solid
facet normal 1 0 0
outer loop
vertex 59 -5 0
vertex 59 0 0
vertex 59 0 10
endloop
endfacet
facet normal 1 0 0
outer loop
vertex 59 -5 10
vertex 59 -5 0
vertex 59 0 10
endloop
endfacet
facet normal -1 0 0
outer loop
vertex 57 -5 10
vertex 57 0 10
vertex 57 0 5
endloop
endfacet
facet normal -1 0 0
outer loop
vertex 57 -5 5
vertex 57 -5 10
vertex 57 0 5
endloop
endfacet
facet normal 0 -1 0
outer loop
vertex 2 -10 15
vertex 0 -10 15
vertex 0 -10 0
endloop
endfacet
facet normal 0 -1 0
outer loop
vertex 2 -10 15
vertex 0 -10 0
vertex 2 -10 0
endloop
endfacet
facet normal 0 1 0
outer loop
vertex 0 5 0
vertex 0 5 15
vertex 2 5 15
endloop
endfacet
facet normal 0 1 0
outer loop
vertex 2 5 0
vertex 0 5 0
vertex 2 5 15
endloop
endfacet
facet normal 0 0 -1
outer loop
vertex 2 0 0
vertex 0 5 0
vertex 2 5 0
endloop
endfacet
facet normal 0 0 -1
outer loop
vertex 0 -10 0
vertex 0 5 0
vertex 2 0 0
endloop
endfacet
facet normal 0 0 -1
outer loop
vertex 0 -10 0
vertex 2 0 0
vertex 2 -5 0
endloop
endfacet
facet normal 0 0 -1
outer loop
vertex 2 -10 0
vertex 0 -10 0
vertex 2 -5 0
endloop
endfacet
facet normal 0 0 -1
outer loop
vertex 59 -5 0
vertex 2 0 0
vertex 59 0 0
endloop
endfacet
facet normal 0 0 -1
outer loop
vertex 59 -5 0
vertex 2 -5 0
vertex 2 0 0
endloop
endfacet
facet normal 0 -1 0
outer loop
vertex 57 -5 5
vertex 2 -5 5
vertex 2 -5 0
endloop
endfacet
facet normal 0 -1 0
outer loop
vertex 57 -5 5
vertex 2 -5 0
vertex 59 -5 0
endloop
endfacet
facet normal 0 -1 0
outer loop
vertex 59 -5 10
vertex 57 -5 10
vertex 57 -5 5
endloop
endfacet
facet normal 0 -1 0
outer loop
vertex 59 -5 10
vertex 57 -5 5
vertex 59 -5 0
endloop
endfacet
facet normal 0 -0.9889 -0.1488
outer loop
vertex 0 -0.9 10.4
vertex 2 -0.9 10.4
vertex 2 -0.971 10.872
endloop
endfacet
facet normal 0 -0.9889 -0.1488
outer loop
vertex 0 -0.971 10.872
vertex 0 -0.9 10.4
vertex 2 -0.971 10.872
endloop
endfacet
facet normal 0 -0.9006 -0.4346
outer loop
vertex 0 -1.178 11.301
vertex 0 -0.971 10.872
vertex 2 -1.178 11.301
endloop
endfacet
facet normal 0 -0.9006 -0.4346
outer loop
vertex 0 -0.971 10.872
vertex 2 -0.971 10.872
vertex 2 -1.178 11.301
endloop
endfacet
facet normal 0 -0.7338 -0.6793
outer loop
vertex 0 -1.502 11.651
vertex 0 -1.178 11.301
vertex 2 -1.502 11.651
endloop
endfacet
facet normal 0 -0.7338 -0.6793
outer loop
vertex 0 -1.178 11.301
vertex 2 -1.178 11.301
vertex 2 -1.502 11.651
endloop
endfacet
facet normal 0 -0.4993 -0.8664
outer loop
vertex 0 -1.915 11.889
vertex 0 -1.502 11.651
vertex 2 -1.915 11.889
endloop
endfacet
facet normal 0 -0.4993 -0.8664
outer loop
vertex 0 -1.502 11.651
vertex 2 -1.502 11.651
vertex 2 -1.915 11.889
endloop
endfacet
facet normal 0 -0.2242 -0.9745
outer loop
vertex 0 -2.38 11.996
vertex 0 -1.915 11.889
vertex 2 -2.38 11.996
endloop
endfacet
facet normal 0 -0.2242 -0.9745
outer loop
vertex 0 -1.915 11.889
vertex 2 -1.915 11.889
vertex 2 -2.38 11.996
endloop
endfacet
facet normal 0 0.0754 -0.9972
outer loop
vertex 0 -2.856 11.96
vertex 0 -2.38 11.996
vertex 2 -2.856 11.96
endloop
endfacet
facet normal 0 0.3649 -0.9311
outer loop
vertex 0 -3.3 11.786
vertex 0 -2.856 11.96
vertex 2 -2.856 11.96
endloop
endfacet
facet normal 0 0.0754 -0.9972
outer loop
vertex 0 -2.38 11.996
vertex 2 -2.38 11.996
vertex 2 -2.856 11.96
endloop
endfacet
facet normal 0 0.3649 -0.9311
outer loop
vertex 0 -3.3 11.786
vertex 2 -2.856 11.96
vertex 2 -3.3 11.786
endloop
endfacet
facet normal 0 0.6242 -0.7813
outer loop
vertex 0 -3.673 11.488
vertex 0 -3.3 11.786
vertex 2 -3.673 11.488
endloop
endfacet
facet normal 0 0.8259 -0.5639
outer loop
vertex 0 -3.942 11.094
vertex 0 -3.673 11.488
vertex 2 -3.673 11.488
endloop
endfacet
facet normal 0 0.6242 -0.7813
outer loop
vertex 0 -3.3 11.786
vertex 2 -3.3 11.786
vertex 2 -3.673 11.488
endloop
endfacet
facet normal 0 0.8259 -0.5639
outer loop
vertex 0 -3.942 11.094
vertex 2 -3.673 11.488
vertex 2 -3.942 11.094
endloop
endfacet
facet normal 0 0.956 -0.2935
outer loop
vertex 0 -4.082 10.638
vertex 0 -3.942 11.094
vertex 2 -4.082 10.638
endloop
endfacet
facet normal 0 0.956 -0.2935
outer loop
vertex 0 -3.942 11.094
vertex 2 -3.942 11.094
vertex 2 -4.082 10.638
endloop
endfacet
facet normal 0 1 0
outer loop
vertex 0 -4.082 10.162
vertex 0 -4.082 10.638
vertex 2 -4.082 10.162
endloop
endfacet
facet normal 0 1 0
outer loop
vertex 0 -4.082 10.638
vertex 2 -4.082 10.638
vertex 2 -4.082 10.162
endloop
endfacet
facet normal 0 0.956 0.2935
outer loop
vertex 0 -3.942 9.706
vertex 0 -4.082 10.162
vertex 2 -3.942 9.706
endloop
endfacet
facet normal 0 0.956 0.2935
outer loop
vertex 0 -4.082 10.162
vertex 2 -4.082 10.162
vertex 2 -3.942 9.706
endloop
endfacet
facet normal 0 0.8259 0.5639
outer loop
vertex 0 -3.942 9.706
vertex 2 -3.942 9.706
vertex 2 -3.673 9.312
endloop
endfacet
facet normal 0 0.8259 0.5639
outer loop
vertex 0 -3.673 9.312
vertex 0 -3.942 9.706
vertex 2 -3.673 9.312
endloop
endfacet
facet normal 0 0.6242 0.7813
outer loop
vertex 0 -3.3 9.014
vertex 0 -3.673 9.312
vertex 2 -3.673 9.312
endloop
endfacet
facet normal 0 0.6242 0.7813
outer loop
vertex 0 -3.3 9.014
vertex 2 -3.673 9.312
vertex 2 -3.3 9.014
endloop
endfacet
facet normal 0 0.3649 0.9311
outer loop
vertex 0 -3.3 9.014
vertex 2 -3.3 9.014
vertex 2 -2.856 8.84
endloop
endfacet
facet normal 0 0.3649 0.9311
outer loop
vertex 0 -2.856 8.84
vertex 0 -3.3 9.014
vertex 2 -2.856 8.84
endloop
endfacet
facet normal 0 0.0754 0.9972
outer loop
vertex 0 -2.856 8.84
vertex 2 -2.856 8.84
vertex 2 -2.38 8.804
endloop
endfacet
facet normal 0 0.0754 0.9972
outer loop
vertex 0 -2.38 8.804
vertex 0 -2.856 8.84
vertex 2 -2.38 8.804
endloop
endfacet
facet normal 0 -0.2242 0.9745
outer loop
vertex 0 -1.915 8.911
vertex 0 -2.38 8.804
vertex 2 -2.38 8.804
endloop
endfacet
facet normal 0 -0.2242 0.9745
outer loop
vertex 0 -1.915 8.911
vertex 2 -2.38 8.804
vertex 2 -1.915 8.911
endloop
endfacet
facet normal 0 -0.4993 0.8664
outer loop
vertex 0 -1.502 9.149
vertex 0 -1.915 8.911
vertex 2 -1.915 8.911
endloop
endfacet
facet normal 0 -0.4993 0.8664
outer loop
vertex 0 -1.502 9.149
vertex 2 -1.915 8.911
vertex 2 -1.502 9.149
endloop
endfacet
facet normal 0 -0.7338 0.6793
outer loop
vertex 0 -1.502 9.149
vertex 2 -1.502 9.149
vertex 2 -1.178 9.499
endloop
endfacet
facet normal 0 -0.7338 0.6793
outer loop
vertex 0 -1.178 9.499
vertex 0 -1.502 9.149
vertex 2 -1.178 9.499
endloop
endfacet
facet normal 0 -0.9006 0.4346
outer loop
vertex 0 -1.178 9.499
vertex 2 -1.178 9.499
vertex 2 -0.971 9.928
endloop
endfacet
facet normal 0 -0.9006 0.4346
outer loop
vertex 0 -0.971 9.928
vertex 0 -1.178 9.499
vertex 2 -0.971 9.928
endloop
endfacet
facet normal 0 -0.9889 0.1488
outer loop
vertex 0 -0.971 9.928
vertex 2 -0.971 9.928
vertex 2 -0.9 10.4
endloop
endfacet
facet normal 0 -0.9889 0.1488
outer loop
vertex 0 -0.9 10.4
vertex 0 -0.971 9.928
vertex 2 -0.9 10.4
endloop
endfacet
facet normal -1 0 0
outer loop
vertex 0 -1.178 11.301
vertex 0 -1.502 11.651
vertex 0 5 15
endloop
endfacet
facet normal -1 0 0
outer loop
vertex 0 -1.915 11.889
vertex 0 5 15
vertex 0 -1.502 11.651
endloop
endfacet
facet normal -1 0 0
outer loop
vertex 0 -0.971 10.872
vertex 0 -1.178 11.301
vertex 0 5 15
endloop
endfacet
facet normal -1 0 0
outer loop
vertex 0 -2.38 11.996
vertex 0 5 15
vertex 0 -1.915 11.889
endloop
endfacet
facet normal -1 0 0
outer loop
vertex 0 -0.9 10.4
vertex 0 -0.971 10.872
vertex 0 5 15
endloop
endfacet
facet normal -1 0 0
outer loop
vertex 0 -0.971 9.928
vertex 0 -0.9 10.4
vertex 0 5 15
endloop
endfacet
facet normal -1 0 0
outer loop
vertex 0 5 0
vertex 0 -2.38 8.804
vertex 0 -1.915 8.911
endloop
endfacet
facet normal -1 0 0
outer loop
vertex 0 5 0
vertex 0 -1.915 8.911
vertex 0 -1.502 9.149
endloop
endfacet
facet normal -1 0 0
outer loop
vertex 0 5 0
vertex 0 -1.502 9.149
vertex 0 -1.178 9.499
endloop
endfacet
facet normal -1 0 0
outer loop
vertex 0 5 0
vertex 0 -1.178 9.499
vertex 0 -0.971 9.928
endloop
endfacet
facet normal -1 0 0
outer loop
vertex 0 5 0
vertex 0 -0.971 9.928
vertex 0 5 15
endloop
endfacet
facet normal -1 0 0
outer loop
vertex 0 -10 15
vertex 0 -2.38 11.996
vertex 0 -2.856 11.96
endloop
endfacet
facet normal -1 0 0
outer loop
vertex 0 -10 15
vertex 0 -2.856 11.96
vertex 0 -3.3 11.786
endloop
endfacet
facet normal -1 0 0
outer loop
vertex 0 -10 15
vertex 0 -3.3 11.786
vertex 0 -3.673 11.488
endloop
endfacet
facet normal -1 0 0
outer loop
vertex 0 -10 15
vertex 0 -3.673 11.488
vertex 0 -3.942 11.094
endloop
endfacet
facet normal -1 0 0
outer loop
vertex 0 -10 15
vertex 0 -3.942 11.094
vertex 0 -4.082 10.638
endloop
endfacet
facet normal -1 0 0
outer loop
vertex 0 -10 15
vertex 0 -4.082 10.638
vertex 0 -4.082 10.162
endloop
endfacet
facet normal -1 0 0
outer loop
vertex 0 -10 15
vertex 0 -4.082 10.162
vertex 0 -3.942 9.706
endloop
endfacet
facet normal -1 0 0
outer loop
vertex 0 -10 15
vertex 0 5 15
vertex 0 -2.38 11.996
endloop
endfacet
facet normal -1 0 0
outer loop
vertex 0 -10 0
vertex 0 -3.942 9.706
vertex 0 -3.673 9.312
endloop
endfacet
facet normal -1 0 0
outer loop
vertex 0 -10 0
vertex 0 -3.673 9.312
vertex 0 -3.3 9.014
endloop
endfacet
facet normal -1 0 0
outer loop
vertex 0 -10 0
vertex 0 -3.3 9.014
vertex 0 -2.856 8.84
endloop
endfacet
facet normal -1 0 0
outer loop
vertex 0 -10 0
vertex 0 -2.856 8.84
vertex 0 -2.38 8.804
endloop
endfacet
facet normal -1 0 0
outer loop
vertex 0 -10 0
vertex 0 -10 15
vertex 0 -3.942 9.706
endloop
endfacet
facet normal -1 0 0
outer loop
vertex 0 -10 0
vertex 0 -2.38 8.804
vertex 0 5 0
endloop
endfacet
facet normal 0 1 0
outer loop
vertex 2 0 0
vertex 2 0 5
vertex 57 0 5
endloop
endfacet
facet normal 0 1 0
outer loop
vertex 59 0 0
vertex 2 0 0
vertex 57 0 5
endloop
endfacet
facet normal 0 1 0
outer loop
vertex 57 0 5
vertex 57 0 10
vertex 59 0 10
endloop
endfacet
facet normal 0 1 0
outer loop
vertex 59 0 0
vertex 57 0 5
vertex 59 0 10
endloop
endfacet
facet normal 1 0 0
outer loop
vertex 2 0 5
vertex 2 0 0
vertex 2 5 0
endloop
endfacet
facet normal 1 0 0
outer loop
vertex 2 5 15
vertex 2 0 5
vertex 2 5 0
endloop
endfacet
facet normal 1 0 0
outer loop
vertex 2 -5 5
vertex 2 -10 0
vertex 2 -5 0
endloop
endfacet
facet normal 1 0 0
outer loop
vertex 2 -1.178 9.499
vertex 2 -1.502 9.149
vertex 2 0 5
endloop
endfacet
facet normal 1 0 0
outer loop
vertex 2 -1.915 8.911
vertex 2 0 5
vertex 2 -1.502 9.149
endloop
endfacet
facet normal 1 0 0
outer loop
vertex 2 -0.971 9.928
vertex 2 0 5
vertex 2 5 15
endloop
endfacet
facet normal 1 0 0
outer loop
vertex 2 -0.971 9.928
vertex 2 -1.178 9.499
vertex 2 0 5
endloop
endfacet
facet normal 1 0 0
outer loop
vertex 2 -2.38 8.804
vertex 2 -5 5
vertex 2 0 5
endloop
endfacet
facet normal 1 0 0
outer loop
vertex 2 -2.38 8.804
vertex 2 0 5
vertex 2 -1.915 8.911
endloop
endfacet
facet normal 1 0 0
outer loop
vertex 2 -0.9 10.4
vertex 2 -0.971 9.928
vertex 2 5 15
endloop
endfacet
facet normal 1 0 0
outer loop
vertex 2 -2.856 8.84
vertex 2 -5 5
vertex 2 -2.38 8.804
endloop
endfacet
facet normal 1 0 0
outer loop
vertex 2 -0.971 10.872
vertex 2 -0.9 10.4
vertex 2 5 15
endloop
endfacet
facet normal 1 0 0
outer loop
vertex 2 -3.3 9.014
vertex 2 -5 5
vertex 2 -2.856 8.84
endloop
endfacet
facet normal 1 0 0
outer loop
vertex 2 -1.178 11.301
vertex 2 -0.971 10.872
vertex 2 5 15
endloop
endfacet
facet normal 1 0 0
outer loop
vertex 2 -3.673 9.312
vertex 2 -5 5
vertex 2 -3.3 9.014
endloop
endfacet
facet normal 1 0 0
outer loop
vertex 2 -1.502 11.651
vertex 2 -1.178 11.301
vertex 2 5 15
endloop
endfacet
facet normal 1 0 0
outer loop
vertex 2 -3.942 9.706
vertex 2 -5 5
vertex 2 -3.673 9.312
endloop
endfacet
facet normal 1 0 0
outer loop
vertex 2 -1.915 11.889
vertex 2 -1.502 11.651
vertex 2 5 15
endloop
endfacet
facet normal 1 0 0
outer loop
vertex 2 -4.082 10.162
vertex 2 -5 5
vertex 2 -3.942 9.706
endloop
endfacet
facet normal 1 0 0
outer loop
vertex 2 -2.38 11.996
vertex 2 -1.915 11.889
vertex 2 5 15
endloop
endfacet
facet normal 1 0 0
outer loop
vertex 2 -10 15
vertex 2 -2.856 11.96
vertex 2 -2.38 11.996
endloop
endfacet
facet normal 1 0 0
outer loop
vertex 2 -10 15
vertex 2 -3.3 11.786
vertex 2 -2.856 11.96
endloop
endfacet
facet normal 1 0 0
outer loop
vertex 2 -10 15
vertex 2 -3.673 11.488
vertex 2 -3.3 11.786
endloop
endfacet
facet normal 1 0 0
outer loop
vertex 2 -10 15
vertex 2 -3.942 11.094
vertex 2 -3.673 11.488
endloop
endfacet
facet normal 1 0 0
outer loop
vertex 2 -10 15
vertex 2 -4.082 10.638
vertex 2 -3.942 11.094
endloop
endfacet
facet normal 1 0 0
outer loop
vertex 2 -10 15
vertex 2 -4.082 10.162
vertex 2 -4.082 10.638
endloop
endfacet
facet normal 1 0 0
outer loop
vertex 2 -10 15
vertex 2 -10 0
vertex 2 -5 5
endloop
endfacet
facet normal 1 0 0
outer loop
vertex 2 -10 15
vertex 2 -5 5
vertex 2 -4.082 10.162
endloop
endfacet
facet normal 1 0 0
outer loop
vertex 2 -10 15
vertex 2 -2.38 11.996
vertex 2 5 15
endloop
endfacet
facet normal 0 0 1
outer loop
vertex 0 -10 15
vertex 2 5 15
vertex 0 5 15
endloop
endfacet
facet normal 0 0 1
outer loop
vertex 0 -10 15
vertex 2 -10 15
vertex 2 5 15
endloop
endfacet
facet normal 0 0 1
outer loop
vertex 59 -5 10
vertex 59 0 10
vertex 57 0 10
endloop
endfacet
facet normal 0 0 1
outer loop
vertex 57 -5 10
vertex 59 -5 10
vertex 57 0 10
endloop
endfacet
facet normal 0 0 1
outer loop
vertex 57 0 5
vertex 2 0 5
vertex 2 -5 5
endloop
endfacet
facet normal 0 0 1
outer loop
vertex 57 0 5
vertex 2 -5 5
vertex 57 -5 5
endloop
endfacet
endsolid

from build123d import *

# Parameters (mm, degrees)
F0_W          = 55
F0_H          = 5
F1_DEPTH      = 5
F2_DEPTH      = 10
F2_DEPTH_BACK = 5
F4_D          = 3.2
F4_DEPTH      = 2.001


with BuildPart() as f1:
    # F0 (on Front) → F1 (new body)
    with BuildSketch(Plane.XZ):
        with Locations((29.5, 2.5)):
            Rectangle(F0_W, F0_H)
        Polygon((57, 5), (57, 0), (59, 0), (59, 10), (57, 10), align=None)
    extrude(amount=F1_DEPTH)

    # F0 (on Front) → F2 (join, two sides)
    with BuildSketch(Plane.XZ) as f2_sk:
        Polygon((0, 15), (0, 0), (2, 0), (2, 5), (2, 15), align=None)
    extrude(amount=F2_DEPTH)
    extrude(f2_sk.sketch, amount=-F2_DEPTH_BACK)

    # F4 (through all, one way)
    with BuildSketch(Plane.YZ.offset(2)):
        with Locations((-2.5, 10.4)):
            Circle(F4_D / 2)
    extrude(amount=-F4_DEPTH, mode=Mode.SUBTRACT)


solid = f1.part
